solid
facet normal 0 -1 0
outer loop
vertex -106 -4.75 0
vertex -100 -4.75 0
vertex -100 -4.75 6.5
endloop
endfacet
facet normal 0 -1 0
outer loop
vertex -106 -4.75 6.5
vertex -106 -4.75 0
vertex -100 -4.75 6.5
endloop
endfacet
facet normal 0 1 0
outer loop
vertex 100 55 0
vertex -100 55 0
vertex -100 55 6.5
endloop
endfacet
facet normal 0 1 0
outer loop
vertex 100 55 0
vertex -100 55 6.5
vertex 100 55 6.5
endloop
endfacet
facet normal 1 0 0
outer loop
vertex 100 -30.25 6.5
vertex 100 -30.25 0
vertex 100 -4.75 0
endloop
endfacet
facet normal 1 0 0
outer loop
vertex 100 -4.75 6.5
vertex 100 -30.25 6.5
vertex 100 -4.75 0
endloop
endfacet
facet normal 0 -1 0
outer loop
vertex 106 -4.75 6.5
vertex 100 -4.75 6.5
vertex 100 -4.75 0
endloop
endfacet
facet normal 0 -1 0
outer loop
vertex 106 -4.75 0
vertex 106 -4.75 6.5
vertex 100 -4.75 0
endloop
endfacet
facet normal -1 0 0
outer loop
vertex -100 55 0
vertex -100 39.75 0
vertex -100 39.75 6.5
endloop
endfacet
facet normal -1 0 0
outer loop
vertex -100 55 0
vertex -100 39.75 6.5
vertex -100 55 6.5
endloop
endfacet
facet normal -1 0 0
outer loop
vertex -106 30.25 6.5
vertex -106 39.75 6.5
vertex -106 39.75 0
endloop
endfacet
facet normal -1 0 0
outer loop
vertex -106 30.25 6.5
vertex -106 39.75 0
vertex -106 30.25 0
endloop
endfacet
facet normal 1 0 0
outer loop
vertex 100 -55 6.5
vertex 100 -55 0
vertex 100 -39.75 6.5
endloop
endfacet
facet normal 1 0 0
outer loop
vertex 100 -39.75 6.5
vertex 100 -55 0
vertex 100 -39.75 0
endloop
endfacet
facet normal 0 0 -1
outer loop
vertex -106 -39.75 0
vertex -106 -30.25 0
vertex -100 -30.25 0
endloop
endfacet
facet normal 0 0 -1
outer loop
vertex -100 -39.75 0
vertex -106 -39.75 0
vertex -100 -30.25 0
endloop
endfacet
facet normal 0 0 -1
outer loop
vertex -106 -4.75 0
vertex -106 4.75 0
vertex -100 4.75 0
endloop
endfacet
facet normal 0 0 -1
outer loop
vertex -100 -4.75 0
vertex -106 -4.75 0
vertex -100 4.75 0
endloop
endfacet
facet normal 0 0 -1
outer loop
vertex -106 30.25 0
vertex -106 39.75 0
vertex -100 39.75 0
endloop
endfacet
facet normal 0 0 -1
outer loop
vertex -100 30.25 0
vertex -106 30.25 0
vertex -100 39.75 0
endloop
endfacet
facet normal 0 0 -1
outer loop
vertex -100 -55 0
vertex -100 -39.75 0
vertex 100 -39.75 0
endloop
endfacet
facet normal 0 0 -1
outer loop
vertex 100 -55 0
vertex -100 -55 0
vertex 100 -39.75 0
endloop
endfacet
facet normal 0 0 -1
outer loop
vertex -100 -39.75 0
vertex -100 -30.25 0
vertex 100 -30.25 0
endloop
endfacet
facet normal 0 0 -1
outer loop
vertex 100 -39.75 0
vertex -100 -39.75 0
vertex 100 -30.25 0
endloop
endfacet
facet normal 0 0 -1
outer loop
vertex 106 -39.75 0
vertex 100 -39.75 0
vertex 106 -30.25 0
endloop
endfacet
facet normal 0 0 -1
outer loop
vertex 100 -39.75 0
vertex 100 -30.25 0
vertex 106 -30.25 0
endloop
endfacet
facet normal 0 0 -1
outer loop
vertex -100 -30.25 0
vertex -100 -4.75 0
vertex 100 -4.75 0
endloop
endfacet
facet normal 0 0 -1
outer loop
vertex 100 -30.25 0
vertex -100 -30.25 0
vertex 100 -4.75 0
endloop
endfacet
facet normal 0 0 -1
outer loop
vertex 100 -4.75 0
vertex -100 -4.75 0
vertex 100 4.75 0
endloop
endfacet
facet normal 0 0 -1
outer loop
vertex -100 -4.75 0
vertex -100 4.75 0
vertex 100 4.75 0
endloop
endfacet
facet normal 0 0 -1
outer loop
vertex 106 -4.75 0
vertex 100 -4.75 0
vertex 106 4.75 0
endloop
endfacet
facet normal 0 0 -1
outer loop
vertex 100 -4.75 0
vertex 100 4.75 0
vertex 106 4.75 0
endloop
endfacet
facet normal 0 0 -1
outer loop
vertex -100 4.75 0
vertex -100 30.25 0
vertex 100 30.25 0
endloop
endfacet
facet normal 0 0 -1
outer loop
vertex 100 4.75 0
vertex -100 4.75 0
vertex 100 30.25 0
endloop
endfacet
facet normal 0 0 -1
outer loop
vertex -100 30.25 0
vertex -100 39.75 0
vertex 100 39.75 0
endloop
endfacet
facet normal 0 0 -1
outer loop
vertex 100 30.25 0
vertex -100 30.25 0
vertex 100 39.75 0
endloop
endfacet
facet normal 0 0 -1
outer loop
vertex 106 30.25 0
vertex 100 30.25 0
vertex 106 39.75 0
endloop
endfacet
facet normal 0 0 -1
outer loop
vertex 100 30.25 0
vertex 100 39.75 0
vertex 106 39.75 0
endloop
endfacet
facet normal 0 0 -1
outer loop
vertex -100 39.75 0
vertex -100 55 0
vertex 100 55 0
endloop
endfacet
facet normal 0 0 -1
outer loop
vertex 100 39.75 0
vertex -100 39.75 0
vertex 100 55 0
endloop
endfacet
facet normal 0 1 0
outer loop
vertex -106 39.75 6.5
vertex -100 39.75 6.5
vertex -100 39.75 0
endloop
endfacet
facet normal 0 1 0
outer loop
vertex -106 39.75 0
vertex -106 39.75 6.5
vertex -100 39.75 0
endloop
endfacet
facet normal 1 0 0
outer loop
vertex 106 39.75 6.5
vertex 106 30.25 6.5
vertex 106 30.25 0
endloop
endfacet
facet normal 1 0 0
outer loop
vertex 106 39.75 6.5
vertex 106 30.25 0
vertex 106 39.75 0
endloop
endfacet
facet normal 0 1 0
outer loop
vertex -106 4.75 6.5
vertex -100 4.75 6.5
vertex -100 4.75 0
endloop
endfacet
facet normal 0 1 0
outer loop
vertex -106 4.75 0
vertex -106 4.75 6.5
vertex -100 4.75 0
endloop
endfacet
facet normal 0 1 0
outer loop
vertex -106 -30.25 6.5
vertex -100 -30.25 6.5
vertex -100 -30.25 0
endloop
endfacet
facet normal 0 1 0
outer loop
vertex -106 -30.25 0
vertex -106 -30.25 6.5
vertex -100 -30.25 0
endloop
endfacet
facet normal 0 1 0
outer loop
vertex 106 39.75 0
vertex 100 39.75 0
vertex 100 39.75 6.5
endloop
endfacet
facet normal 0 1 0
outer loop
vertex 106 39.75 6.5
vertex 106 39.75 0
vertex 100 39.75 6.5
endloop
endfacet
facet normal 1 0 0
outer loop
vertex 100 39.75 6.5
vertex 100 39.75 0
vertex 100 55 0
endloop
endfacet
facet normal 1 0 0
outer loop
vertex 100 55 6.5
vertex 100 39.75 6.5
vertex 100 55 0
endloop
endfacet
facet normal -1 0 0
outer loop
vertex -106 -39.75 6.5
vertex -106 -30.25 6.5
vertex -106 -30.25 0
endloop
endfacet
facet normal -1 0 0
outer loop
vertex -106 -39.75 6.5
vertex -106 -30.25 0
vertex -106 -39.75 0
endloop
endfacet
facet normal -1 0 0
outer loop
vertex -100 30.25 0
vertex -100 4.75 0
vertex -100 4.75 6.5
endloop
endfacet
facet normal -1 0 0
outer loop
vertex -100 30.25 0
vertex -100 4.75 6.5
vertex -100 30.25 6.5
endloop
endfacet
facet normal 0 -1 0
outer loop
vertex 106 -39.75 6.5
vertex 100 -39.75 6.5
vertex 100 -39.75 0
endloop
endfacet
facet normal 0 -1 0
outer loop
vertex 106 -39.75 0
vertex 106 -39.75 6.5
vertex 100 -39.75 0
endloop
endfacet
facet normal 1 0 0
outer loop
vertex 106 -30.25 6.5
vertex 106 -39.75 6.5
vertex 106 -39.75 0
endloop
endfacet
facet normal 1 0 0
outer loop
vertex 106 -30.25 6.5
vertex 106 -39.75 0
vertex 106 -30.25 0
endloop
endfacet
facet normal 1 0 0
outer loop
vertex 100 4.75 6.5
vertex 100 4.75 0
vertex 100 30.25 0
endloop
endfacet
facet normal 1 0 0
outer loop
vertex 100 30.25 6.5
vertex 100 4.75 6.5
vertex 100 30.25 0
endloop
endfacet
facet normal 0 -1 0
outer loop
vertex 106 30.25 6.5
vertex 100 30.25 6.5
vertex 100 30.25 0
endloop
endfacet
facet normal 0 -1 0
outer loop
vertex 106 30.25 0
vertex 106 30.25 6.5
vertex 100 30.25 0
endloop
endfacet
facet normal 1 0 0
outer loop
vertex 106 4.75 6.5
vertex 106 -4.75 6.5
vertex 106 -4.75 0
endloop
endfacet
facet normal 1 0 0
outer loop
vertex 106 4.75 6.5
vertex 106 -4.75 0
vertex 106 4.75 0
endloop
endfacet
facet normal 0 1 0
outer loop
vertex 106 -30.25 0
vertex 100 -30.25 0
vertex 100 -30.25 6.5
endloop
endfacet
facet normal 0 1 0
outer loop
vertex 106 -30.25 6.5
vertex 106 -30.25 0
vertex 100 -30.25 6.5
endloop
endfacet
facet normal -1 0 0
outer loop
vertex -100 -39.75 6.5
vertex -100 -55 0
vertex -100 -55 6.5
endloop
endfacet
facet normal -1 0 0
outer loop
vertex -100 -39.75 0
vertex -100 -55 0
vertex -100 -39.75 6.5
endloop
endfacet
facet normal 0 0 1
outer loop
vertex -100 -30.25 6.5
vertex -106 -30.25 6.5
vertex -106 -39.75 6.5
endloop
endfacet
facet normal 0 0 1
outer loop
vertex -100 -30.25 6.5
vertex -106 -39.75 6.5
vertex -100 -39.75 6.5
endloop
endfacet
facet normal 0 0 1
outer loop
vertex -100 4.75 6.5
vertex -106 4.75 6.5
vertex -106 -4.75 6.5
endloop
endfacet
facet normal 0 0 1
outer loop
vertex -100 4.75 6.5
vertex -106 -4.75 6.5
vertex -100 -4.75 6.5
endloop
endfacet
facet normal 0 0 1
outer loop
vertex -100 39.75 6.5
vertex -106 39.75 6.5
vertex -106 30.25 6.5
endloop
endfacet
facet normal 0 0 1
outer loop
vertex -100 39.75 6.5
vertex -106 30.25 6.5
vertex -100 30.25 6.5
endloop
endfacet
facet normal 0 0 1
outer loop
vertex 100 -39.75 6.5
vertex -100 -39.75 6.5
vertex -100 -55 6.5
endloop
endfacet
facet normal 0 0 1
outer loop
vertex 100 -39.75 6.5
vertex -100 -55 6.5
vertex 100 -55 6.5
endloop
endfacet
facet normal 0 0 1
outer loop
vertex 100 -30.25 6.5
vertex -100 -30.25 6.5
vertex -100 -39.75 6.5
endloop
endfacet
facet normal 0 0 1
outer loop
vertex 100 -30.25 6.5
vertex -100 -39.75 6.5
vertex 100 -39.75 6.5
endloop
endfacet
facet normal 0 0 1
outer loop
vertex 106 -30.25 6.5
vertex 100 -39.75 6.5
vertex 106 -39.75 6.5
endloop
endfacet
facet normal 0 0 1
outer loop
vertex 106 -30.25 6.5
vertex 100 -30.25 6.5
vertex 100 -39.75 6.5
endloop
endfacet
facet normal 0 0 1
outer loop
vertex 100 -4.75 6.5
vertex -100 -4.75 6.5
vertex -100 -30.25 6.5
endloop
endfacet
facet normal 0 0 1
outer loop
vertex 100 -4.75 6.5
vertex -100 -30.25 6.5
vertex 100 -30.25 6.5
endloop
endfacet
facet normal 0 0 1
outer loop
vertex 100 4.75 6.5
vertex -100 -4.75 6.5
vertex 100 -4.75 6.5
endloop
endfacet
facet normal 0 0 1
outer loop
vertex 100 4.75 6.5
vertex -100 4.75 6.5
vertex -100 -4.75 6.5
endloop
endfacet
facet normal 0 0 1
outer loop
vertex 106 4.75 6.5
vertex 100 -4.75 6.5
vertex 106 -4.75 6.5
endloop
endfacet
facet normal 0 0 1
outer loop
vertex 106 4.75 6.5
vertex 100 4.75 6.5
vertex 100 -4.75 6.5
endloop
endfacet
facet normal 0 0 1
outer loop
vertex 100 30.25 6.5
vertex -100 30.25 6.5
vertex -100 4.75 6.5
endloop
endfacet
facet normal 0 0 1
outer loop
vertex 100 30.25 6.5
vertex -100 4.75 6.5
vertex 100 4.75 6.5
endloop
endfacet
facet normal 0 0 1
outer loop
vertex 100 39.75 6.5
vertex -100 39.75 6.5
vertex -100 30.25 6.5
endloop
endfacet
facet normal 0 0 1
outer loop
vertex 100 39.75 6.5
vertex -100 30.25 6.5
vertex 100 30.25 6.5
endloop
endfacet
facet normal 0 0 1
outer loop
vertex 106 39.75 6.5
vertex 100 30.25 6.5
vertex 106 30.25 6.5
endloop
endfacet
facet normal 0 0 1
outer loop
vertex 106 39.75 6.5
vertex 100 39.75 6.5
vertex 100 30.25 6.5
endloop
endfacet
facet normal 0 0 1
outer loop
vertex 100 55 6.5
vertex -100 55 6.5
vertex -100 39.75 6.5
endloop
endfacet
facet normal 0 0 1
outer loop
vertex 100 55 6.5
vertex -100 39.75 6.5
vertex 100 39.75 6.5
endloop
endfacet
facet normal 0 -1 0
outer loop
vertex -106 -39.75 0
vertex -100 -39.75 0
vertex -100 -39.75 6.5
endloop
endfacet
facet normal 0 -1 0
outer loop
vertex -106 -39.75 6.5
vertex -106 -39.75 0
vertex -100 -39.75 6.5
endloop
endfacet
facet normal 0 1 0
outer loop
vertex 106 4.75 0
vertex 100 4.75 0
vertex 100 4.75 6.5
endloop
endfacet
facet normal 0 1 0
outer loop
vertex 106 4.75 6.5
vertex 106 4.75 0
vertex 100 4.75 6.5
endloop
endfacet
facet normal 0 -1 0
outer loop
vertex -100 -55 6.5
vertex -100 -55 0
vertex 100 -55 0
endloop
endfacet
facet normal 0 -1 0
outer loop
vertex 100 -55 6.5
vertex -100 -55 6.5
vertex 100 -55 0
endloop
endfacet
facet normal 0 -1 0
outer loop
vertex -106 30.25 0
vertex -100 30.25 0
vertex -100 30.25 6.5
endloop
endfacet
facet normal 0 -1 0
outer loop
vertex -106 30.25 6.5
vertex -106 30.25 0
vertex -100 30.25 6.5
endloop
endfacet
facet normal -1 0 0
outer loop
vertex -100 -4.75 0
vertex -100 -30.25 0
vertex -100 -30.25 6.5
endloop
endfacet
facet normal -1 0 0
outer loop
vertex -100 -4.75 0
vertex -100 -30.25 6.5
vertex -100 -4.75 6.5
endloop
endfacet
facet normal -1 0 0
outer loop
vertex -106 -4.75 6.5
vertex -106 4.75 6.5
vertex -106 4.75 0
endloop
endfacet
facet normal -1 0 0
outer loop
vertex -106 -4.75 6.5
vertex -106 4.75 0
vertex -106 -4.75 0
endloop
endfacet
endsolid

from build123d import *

# Parameters (mm, degrees)
F0_W     = 200
F0_H     = 110
F1_DEPTH = 6.5
F3_DEPTH = 6
F5_DEPTH = 6


with BuildPart() as f1:
    # F0 (on Top) → F1 (new body)
    with BuildSketch(Plane.XY):
        Rectangle(F0_W, F0_H)
    extrude(amount=F1_DEPTH)

    # F2 (on face) → F3 (join)
    with BuildSketch(Plane(origin=(-100, 0, 0), x_dir=(0, -1, 0), z_dir=(-1, 0, 0))):
        Polygon((-39.75, 6.5), (-39.75, 3.25), (-35, 3.25), (-30.25, 3.25), (-30.25, 6.5), align=None)
        Polygon((-35, 3.25), (-39.75, 3.25), (-39.75, 0), (-30.25, 0), (-30.25, 3.25), align=None)
        Polygon((-4.75, 6.5), (-4.75, 3.25), (0, 3.25), (4.75, 3.25), (4.75, 6.5), align=None)
        Polygon((0, 3.25), (-4.75, 3.25), (-4.75, 0), (4.75, 0), (4.75, 3.25), align=None)
        Polygon((39.75, 6.5), (30.25, 6.5), (30.25, 3.25), (35, 3.25), (39.75, 3.25), align=None)
        Polygon((30.25, 3.25), (30.25, 0), (39.75, 0), (39.75, 3.25), (35, 3.25), align=None)
    extrude(amount=F3_DEPTH)

    # F4 (on face) → F5 (join)
    with BuildSketch(Plane.YZ.offset(100)):
        Polygon((-39.75, 6.5), (-39.75, 3.25), (-35, 3.25), (-30.25, 3.25), (-30.25, 6.5), align=None)
        Polygon((-35, 3.25), (-39.75, 3.25), (-39.75, 0), (-30.25, 0), (-30.25, 3.25), align=None)
        Polygon((-4.75, 6.5), (-4.75, 3.25), (0, 3.25), (4.75, 3.25), (4.75, 6.5), align=None)
        Polygon((0, 3.25), (-4.75, 3.25), (-4.75, 0), (4.75, 0), (4.75, 3.25), align=None)
        Polygon((39.75, 6.5), (30.25, 6.5), (30.25, 3.25), (30.25, 0), (39.75, 0), align=None)
    extrude(amount=F5_DEPTH)


solid = f1.part
